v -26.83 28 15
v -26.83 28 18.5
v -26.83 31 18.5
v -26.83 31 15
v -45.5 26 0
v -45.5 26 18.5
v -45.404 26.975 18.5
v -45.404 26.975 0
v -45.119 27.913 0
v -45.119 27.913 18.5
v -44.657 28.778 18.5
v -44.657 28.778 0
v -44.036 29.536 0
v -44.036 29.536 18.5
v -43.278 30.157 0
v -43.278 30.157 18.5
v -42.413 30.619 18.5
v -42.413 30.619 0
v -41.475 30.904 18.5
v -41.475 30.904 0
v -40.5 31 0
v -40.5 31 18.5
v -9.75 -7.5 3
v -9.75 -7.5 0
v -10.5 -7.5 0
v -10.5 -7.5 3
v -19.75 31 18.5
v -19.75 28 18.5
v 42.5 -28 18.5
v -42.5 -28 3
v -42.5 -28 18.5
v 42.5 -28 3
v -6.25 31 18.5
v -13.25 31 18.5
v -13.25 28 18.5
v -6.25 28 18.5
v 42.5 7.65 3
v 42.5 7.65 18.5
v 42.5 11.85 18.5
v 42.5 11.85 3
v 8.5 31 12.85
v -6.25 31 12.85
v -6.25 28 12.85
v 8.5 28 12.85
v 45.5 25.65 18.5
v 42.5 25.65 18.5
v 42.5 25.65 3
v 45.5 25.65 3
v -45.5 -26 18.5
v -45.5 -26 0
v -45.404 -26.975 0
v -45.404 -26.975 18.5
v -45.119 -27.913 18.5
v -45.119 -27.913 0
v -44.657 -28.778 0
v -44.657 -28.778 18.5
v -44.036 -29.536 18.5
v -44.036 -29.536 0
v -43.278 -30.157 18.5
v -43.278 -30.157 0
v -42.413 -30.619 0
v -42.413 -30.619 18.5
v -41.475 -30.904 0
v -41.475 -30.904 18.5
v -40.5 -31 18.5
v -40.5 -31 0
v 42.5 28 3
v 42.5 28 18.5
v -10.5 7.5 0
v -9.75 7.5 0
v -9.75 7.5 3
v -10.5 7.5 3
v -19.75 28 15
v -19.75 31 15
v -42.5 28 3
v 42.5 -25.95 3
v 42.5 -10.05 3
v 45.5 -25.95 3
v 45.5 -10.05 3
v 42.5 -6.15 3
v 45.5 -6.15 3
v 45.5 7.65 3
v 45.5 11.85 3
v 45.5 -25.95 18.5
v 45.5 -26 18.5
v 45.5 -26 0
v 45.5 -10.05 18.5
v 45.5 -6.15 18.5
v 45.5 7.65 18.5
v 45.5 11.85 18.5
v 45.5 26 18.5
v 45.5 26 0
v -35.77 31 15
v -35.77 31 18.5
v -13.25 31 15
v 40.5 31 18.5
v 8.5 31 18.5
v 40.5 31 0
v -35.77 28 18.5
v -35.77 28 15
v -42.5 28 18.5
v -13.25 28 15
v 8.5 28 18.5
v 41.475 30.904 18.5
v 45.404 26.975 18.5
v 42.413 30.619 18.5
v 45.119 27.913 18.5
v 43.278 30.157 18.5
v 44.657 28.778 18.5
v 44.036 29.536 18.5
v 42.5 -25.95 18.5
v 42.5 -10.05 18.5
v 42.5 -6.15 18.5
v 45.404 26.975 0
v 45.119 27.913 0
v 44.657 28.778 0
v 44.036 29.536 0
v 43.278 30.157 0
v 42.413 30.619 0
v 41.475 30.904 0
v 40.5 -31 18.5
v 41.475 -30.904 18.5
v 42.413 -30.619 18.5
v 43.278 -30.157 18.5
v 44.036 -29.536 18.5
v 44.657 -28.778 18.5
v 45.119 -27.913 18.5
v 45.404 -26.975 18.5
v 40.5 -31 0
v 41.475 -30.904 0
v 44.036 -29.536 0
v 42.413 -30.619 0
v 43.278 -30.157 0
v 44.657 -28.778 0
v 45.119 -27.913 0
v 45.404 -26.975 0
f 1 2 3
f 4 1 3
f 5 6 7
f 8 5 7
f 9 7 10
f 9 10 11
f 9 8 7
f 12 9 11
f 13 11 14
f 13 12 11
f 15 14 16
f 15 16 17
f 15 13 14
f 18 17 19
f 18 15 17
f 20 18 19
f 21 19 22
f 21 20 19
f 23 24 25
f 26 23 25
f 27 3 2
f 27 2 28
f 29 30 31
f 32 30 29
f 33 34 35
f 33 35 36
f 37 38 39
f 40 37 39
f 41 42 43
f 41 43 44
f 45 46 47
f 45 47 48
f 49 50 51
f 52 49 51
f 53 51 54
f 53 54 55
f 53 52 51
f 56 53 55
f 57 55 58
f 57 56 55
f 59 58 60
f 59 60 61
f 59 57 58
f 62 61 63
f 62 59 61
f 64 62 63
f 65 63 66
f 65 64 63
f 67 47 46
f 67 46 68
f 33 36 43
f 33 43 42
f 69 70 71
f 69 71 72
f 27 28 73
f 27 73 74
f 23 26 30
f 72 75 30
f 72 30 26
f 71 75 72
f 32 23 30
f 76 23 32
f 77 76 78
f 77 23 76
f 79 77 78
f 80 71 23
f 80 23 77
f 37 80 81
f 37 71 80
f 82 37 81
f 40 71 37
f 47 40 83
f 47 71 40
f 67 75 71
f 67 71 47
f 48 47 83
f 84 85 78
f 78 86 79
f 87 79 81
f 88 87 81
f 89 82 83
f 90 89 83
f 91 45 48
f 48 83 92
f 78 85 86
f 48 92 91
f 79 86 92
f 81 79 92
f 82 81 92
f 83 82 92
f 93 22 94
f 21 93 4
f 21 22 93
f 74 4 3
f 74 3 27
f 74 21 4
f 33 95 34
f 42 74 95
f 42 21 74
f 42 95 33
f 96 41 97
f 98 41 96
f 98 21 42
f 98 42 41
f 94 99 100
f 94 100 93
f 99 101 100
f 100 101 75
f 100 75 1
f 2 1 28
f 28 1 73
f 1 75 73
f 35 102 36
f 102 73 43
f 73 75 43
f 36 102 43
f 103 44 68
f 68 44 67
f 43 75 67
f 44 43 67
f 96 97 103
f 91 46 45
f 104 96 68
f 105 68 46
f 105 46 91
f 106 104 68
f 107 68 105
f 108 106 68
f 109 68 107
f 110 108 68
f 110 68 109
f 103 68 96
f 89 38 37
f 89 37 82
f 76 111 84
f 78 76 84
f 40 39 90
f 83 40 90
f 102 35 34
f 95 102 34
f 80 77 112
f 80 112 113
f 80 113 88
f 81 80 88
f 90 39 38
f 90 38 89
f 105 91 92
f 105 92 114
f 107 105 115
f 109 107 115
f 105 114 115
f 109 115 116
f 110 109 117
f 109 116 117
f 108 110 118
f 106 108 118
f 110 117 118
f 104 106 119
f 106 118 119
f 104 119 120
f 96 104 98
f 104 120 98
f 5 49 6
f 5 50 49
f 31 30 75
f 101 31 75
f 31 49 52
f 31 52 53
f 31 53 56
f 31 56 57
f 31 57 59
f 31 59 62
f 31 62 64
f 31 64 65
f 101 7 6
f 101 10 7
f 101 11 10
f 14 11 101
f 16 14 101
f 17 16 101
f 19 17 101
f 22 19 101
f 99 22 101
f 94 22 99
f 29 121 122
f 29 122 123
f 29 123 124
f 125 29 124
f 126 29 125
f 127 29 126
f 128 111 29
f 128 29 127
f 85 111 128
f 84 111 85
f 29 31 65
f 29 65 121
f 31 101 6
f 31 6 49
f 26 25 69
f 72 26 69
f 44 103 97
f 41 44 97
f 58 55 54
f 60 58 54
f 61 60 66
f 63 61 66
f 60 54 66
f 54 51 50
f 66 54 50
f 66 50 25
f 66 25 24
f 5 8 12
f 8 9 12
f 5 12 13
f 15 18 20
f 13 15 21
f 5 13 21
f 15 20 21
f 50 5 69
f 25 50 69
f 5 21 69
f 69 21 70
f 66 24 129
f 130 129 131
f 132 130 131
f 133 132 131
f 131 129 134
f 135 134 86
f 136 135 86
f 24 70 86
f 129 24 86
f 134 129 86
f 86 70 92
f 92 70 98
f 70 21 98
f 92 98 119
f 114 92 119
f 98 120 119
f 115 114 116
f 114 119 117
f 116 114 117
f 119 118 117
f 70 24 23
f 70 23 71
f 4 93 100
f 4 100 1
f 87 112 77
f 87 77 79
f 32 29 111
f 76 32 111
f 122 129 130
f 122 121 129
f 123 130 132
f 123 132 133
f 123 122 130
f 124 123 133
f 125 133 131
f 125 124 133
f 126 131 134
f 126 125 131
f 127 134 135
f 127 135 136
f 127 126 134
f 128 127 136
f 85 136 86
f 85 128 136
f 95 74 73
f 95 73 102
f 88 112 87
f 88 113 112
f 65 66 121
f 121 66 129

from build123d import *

# Parameters (mm, degrees)
SKETCH1_W           = 91
SKETCH1_H           = 62
BOSS_EXTRUDE1_DEPTH = 3
SKETCH2_W           = 91
SKETCH2_H           = 62
SKETCH2_W_2         = 85
SKETCH2_H_2         = 56
BOSS_EXTRUDE2_DEPTH = 15.5
FILLET1_R           = 5
SKETCH3_W           = 3
SKETCH3_H           = 15.9
SKETCH3_H_2         = 13.8
CUT_EXTRUDE2_DEPTH  = 15.5
SKETCH4_W           = 8.94
SKETCH4_H           = 3
SKETCH4_W_2         = 6.5
CUT_EXTRUDE3_DEPTH  = 3.5
SKETCH5_W           = 14.75
SKETCH5_H           = 3
CUT_EXTRUDE4_DEPTH  = 5.65
SKETCH6_W           = 0.75
SKETCH6_H           = 15
CUT_EXTRUDE5_DEPTH  = 3


with BuildPart() as part:
    # Sketch1 → Boss-Extrude1 (new body)
    with BuildSketch(Plane.XY):
        Rectangle(SKETCH1_W, SKETCH1_H)
    extrude(amount=BOSS_EXTRUDE1_DEPTH)

    # Sketch2 → Boss-Extrude2 (add)
    with BuildSketch(Plane.XY.offset(3)):
        Rectangle(SKETCH2_W, SKETCH2_H)
        Rectangle(SKETCH2_W_2, SKETCH2_H_2, mode=Mode.SUBTRACT)
    extrude(amount=BOSS_EXTRUDE2_DEPTH)

    # Fillet1
    fillet1_edges = [part.edges().sort_by_distance(p)[0] for p in [
        (45.5, -31, 9.25),
        (-45.5, -31, 9.25),
        (-45.5, 31, 9.25),
        (45.5, 31, 9.25),
    ]]
    fillet(fillet1_edges, radius=FILLET1_R)

    # Sketch3 → Cut-Extrude2 (cut)
    with BuildSketch(Plane.XY.offset(18.5)):
        with Locations((44, -18)):
            Rectangle(SKETCH3_W, SKETCH3_H)
        with Locations((44, 0.75)):
            Rectangle(SKETCH3_W, SKETCH3_H_2)
        with Locations((44, 18.75)):
            Rectangle(SKETCH3_W, SKETCH3_H_2)
    extrude(amount=-CUT_EXTRUDE2_DEPTH, mode=Mode.SUBTRACT)

    # Sketch4 → Cut-Extrude3 (cut)
    with BuildSketch(Plane.XY.offset(18.5)):
        with Locations((-31.3, 29.5)):
            Rectangle(SKETCH4_W, SKETCH4_H)
        with Locations((-16.5, 29.5)):
            Rectangle(SKETCH4_W_2, SKETCH4_H)
        with Locations((-3, 29.5)):
            Rectangle(SKETCH4_W_2, SKETCH4_H)
    extrude(amount=-CUT_EXTRUDE3_DEPTH, mode=Mode.SUBTRACT)

    # Sketch5 → Cut-Extrude4 (cut)
    with BuildSketch(Plane.XY.offset(18.5)):
        with Locations((1.125, 29.5)):
            Rectangle(SKETCH5_W, SKETCH5_H)
    extrude(amount=-CUT_EXTRUDE4_DEPTH, mode=Mode.SUBTRACT)

    # Sketch6 → Cut-Extrude5 (cut)
    with BuildSketch(Plane(origin=(0, 0, 0), x_dir=(-1, 0, 0), z_dir=(0, 0, -1))):
        with Locations((10.125, 0)):
            Rectangle(SKETCH6_W, SKETCH6_H)
    extrude(amount=-CUT_EXTRUDE5_DEPTH, mode=Mode.SUBTRACT)


solid = part.part
